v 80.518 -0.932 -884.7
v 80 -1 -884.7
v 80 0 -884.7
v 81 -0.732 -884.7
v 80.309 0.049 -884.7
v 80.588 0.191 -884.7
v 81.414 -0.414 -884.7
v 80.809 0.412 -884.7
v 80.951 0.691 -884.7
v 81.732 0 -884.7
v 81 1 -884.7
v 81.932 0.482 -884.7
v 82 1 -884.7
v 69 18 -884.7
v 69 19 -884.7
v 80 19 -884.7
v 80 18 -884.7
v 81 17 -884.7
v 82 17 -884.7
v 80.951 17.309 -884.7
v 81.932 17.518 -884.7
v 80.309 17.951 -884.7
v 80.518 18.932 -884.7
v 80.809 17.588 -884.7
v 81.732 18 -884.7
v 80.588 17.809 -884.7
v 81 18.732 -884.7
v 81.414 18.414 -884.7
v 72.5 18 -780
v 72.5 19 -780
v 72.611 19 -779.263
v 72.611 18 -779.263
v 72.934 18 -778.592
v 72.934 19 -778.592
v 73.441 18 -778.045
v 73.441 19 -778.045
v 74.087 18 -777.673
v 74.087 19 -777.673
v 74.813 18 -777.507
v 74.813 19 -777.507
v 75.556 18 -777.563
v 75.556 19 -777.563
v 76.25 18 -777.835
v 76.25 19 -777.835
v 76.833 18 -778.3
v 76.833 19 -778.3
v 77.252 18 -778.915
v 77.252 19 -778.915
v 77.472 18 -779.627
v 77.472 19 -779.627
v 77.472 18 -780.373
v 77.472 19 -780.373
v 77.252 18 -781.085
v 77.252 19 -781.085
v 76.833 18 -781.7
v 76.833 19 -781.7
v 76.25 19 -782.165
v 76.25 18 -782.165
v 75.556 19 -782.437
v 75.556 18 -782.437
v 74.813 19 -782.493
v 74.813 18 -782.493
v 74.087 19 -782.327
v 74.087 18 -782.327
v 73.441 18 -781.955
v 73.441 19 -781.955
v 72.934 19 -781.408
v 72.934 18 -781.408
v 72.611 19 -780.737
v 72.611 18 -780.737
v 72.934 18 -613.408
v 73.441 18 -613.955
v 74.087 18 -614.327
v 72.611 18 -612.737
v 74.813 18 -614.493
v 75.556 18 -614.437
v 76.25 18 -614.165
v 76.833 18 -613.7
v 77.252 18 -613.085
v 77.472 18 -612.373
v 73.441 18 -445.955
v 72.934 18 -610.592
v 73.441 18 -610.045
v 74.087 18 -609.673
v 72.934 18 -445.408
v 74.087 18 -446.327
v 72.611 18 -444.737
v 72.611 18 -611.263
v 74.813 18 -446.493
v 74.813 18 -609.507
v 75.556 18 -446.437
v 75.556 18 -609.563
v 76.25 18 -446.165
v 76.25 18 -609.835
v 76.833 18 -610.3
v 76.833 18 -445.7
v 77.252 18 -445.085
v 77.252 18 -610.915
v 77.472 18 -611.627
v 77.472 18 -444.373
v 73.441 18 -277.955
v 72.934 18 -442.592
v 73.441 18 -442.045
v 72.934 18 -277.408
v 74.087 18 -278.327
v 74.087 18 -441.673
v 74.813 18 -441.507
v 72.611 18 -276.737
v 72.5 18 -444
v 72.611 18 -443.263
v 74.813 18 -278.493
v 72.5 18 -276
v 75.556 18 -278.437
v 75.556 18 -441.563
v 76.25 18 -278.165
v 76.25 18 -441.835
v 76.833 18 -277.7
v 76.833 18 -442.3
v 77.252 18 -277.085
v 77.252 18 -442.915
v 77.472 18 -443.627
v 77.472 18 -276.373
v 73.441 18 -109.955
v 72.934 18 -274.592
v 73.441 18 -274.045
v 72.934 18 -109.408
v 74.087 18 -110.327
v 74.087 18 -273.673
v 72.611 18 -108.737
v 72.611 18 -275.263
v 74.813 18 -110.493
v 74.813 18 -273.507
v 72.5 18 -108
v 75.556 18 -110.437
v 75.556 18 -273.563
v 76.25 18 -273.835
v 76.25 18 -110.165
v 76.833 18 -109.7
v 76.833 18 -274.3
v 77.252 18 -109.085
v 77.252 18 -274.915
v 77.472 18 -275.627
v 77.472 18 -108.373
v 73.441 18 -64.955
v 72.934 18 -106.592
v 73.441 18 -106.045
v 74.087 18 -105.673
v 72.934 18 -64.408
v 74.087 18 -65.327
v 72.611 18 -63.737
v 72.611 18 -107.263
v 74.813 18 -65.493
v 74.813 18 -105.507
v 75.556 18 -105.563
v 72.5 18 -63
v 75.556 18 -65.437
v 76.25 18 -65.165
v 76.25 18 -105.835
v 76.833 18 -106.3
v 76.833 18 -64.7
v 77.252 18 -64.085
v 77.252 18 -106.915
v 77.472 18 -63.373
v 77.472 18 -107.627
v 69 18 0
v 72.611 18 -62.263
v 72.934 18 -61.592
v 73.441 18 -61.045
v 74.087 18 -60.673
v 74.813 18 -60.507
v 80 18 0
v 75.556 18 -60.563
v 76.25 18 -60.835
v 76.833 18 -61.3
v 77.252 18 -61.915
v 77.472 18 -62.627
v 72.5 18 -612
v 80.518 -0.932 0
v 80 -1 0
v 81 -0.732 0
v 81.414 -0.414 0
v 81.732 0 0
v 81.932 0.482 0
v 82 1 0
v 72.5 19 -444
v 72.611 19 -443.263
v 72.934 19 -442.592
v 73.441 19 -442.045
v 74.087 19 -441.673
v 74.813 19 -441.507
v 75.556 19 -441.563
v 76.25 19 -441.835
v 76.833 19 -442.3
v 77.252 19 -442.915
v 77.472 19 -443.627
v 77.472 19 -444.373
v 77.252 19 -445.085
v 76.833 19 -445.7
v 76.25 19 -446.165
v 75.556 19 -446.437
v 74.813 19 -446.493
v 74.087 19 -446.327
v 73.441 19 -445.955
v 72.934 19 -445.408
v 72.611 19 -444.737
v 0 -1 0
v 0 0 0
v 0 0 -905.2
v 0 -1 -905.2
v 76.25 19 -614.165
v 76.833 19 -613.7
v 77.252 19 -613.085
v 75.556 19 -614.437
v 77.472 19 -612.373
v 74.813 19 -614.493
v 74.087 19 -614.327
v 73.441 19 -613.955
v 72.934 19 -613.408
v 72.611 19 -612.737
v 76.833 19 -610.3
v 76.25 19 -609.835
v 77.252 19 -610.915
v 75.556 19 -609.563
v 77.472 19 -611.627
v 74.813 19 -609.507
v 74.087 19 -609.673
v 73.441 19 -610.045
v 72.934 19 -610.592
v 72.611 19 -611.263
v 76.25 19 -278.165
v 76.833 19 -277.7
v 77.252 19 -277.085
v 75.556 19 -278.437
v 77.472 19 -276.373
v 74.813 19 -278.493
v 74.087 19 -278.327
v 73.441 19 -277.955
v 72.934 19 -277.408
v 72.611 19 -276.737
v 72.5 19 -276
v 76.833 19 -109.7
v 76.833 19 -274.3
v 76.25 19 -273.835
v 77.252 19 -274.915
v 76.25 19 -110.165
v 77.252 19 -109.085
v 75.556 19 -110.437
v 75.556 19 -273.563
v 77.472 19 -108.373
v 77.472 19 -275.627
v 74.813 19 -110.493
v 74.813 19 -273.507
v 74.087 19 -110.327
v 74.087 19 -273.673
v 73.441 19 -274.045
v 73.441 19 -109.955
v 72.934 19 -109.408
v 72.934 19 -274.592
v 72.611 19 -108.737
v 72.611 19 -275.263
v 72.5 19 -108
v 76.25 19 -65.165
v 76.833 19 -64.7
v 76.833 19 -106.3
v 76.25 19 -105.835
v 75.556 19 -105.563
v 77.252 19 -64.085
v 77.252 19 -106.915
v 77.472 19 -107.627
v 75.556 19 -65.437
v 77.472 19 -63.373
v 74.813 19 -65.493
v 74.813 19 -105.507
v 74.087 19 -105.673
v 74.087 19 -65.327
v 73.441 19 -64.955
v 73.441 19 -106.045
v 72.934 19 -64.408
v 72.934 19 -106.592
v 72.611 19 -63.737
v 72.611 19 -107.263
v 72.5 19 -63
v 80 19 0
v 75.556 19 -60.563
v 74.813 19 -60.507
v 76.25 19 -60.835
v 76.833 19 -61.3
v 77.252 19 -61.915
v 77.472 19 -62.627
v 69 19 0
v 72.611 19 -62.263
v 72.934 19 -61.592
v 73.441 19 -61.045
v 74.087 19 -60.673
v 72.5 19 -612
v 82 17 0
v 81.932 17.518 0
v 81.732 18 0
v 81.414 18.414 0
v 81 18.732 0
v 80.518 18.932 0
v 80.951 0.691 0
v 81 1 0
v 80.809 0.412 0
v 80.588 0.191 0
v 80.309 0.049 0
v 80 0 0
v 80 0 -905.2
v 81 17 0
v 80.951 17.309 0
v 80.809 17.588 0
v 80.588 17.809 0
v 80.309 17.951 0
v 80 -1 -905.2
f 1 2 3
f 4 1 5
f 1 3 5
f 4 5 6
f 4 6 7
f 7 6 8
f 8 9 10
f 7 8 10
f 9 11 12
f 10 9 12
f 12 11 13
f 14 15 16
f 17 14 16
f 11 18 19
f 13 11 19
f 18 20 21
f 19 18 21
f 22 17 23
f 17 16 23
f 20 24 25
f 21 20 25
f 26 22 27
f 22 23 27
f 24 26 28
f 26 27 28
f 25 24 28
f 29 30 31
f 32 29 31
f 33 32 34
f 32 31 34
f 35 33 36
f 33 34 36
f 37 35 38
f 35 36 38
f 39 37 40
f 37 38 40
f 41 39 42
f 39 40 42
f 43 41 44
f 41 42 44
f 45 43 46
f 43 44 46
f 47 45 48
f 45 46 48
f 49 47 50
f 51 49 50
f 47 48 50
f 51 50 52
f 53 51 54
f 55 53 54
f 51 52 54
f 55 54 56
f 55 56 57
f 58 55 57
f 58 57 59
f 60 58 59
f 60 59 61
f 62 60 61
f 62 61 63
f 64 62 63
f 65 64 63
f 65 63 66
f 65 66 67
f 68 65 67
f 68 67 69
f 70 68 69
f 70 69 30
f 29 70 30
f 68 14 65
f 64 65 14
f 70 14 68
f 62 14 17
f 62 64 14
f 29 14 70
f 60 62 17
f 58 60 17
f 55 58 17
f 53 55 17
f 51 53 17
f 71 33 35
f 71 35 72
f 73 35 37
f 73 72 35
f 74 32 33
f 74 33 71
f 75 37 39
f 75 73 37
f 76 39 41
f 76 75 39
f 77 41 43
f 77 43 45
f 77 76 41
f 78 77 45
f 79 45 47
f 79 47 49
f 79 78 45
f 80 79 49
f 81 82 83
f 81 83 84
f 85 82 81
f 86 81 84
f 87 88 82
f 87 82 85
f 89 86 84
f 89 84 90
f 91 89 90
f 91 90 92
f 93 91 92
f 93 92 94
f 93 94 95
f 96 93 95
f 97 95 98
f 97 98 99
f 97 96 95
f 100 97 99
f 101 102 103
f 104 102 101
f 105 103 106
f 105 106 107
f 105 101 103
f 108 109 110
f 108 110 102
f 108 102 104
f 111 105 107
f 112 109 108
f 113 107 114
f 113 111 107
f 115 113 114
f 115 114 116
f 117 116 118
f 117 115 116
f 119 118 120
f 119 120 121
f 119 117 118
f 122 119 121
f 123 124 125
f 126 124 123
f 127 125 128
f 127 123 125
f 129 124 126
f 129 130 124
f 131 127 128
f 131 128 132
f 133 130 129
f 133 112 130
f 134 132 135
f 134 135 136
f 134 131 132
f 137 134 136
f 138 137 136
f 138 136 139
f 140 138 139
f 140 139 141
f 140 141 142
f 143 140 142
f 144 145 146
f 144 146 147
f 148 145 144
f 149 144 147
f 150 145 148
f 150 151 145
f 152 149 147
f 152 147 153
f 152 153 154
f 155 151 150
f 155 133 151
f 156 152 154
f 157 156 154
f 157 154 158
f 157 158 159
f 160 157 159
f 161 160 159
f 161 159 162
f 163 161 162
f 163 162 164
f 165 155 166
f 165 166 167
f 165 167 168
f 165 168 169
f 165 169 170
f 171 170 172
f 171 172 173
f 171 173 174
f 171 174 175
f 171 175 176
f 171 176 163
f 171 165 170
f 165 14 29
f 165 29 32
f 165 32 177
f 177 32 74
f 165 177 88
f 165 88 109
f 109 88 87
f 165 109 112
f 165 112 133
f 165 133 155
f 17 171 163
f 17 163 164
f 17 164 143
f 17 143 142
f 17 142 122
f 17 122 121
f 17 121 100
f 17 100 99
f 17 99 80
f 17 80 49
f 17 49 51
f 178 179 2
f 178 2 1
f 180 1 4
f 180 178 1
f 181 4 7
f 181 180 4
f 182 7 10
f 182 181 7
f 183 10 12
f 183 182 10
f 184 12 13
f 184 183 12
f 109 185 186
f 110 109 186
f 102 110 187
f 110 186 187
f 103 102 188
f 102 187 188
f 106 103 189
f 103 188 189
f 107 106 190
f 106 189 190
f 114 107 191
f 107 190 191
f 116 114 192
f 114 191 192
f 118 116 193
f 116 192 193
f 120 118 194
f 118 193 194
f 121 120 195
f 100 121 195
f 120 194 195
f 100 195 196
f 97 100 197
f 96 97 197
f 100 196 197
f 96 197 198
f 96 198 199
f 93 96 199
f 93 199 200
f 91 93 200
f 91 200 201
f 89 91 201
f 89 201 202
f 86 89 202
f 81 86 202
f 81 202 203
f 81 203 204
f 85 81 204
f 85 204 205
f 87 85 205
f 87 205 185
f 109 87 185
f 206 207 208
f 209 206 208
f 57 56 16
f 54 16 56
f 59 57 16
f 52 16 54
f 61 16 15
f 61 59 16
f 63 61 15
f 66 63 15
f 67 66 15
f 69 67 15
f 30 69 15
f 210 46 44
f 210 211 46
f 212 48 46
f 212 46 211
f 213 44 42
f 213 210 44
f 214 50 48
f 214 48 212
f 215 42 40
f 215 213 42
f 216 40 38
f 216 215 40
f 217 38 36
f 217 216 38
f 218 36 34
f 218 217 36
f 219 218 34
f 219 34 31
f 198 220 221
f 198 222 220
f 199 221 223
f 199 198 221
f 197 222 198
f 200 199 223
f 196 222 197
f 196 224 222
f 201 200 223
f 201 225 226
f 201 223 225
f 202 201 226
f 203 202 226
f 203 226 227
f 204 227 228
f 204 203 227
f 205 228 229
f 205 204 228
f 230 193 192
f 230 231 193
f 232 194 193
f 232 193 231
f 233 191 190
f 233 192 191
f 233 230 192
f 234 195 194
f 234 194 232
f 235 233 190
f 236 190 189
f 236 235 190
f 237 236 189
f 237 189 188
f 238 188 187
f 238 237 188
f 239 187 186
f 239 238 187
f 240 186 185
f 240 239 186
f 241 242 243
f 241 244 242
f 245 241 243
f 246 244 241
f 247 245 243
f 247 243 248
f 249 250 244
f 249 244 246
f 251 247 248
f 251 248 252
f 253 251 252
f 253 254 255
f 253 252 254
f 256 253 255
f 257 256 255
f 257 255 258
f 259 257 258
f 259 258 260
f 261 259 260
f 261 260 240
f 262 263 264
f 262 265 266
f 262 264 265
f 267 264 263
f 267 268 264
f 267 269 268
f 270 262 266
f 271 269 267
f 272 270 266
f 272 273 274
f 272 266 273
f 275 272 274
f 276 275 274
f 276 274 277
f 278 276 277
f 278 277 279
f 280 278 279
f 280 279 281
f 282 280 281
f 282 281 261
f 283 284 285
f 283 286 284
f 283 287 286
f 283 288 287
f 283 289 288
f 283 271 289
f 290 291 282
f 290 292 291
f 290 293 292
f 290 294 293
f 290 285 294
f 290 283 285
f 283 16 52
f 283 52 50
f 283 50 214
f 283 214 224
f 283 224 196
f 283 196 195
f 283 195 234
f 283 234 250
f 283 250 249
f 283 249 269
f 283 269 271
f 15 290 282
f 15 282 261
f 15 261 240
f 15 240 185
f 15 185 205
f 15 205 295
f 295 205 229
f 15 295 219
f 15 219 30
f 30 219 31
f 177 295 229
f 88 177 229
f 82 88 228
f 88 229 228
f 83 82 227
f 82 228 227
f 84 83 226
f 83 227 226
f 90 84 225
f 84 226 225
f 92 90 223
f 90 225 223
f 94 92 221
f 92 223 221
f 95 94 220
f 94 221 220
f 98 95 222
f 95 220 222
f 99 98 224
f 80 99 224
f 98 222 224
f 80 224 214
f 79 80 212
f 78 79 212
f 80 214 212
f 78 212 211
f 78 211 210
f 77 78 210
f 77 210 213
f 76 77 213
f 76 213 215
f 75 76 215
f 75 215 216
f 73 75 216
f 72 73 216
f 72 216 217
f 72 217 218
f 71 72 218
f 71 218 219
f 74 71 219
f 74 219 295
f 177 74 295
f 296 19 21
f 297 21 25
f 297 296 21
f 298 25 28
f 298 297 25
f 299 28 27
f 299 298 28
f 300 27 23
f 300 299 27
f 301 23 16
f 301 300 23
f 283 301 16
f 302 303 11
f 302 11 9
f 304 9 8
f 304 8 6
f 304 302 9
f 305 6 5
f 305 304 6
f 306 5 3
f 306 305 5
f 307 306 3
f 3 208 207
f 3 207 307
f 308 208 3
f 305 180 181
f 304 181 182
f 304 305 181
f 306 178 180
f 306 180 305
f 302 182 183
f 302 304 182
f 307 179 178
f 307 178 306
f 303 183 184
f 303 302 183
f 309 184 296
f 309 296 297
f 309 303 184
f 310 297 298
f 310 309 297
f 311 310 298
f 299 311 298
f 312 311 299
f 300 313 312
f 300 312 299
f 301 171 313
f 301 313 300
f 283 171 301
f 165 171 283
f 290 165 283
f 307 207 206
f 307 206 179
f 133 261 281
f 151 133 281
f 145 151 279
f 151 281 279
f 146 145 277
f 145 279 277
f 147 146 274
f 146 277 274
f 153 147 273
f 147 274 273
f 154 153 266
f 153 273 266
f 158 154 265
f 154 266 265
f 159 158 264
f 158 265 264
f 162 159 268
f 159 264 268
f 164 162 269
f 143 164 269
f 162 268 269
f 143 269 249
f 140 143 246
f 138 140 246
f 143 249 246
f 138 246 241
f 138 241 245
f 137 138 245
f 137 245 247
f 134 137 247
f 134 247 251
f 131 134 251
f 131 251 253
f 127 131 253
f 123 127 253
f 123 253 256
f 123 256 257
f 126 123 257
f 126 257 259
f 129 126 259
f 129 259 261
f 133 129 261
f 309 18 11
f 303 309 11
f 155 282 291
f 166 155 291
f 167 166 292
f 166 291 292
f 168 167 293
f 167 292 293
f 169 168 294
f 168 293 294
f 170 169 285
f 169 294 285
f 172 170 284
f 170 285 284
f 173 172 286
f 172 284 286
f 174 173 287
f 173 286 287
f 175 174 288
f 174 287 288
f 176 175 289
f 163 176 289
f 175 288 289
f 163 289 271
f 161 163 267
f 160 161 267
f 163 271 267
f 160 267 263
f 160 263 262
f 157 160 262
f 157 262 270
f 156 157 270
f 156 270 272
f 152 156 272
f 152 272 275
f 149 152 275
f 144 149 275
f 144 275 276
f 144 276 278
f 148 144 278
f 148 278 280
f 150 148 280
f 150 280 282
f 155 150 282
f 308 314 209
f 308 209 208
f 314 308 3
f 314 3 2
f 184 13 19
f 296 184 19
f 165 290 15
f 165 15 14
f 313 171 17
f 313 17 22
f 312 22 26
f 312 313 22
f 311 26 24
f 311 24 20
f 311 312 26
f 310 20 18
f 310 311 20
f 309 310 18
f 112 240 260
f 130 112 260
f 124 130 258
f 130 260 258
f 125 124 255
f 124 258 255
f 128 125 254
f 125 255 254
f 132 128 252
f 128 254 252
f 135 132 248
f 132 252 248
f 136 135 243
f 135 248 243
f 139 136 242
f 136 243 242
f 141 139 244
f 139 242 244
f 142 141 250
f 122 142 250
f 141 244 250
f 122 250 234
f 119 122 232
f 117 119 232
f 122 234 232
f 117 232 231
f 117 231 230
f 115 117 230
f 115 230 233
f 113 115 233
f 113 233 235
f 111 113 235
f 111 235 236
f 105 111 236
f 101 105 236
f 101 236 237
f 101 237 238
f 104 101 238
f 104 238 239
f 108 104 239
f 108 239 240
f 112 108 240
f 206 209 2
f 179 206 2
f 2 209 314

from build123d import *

# Parameters (mm, degrees)
SKETCH1_W                    = 82
SKETCH1_H                    = 905.2
BASE_FLANGE1_DEPTH           = 1
EDGE_FLANGE1_STRIP_W         = 6
EDGE_FLANGE1_STRIP_H         = 1
EDGE_FLANGE1_STRIP_CUT_DEPTH = 905.2
EDGE_FLANGE1_DEPTH           = 905.2
EDGE_FLANGE2_STRIP_W         = 6
EDGE_FLANGE2_STRIP_H         = 1
EDGE_FLANGE2_STRIP_CUT_DEPTH = 905.2
EDGE_FLANGE2_DEPTH           = 905.2
SKETCH19_R                   = 2.5
CUT_EXTRUDE2_DEPTH           = 10
CUT_EXTRUDE3_START           = -905.2
CUT_EXTRUDE3_DEPTH           = 20.5


# Read off the part's stored shape, not the designer's step: Cut-Extrude3
# Sheet-metal steps are written as plain solids
with BuildPart() as part:
    # Sketch1 → Base-Flange1 (new body)
    with BuildSketch(Plane(origin=(0, 0, 0), x_dir=(1, 0, 0), z_dir=(0, 1, 0))):
        with Locations((41, 452.6)):
            Rectangle(SKETCH1_W, SKETCH1_H)
    extrude(amount=-BASE_FLANGE1_DEPTH)

    # Edge-Flange1 strip (across the edge) → Edge-Flange1 strip cut (cut)
    with BuildSketch(Plane(origin=(82, 0, 0), x_dir=(-1, 0, 0), z_dir=(0, 0, -1))):
        with Locations((-1, -0.5)):
            Rectangle(EDGE_FLANGE1_STRIP_W, EDGE_FLANGE1_STRIP_H)
    extrude(amount=EDGE_FLANGE1_STRIP_CUT_DEPTH, mode=Mode.SUBTRACT)

    # Edge-Flange1 section (across the edge) → Edge-Flange1 (add)
    with BuildSketch(Plane(origin=(82, 0, 0), x_dir=(-1, 0, 0), z_dir=(0, 0, -1))):
        with BuildLine():
            Line((0, 1), (0, 19))
            Line((0, 19), (1, 19))
            Line((1, 19), (1, 1))
            ThreePointArc((1, 1), (1.292893219, 0.292893219), (2, 0))
            Line((2, 0), (2, -1))
            ThreePointArc((2, -1), (0.585786438, -0.414213562), (0, 1))
        make_face()
    extrude(amount=EDGE_FLANGE1_DEPTH)

    # Edge-Flange2 strip (across the edge) → Edge-Flange2 strip cut (cut)
    with BuildSketch(Plane(origin=(81, 19, 0), x_dir=(0, -1, 0), z_dir=(0, 0, -1))):
        with Locations((-1, -0.5)):
            Rectangle(EDGE_FLANGE2_STRIP_W, EDGE_FLANGE2_STRIP_H)
    extrude(amount=EDGE_FLANGE2_STRIP_CUT_DEPTH, mode=Mode.SUBTRACT)

    # Edge-Flange2 section (across the edge) → Edge-Flange2 (add)
    with BuildSketch(Plane(origin=(81, 19, 0), x_dir=(0, -1, 0), z_dir=(0, 0, -1))):
        with BuildLine():
            Line((0, 1), (0, 12))
            Line((0, 12), (1, 12))
            Line((1, 12), (1, 1))
            ThreePointArc((1, 1), (1.292893219, 0.292893219), (2, 0))
            Line((2, 0), (2, -1))
            ThreePointArc((2, -1), (0.585786438, -0.414213562), (0, 1))
        make_face()
    extrude(amount=EDGE_FLANGE2_DEPTH)

    # Sketch19 → Cut-Extrude2 (cut)
    with BuildSketch(Plane(origin=(0, 19, 0), x_dir=(1, 0, 0), z_dir=(0, 1, 0))):
        with Locations(Location((75, 63, 0), (0, 0, 180))):
            Circle(SKETCH19_R)
        with Locations(Location((75, 108, 0), (0, 0, 180))):
            Circle(SKETCH19_R)
        with Locations(Location((75, 276, 0), (0, 0, 180))):
            Circle(SKETCH19_R)
        with Locations(Location((75, 444, 0), (0, 0, 180))):
            Circle(SKETCH19_R)
        with Locations(Location((75, 612, 0), (0, 0, 180))):
            Circle(SKETCH19_R)
        with Locations(Location((75, 780, 0), (0, 0, 180))):
            Circle(SKETCH19_R)
    extrude(amount=-CUT_EXTRUDE2_DEPTH, mode=Mode.SUBTRACT)

    # Cut-Extrude3 outline → Cut-Extrude3 (cut)
    with BuildSketch(Plane.XY.offset(CUT_EXTRUDE3_START)):
        with BuildLine():
            ThreePointArc((81, 1), (80.707106781, 0.292893219), (80, 0))
            Line((80, 0), (80, -1))
            ThreePointArc((80, -1), (81.414213562, -0.414213562), (82, 1))
            Line((82, 1), (82, 17))
            ThreePointArc((82, 17), (81.414213562, 18.414213562), (80, 19))
            Line((80, 19), (69, 19))
            Line((69, 19), (69, 18))
            Line((69, 18), (80, 18))
            ThreePointArc((80, 18), (80.707106781, 17.707106781), (81, 17))
            Line((81, 17), (81, 1))
        make_face()
    extrude(amount=CUT_EXTRUDE3_DEPTH, mode=Mode.SUBTRACT)


solid = part.part
